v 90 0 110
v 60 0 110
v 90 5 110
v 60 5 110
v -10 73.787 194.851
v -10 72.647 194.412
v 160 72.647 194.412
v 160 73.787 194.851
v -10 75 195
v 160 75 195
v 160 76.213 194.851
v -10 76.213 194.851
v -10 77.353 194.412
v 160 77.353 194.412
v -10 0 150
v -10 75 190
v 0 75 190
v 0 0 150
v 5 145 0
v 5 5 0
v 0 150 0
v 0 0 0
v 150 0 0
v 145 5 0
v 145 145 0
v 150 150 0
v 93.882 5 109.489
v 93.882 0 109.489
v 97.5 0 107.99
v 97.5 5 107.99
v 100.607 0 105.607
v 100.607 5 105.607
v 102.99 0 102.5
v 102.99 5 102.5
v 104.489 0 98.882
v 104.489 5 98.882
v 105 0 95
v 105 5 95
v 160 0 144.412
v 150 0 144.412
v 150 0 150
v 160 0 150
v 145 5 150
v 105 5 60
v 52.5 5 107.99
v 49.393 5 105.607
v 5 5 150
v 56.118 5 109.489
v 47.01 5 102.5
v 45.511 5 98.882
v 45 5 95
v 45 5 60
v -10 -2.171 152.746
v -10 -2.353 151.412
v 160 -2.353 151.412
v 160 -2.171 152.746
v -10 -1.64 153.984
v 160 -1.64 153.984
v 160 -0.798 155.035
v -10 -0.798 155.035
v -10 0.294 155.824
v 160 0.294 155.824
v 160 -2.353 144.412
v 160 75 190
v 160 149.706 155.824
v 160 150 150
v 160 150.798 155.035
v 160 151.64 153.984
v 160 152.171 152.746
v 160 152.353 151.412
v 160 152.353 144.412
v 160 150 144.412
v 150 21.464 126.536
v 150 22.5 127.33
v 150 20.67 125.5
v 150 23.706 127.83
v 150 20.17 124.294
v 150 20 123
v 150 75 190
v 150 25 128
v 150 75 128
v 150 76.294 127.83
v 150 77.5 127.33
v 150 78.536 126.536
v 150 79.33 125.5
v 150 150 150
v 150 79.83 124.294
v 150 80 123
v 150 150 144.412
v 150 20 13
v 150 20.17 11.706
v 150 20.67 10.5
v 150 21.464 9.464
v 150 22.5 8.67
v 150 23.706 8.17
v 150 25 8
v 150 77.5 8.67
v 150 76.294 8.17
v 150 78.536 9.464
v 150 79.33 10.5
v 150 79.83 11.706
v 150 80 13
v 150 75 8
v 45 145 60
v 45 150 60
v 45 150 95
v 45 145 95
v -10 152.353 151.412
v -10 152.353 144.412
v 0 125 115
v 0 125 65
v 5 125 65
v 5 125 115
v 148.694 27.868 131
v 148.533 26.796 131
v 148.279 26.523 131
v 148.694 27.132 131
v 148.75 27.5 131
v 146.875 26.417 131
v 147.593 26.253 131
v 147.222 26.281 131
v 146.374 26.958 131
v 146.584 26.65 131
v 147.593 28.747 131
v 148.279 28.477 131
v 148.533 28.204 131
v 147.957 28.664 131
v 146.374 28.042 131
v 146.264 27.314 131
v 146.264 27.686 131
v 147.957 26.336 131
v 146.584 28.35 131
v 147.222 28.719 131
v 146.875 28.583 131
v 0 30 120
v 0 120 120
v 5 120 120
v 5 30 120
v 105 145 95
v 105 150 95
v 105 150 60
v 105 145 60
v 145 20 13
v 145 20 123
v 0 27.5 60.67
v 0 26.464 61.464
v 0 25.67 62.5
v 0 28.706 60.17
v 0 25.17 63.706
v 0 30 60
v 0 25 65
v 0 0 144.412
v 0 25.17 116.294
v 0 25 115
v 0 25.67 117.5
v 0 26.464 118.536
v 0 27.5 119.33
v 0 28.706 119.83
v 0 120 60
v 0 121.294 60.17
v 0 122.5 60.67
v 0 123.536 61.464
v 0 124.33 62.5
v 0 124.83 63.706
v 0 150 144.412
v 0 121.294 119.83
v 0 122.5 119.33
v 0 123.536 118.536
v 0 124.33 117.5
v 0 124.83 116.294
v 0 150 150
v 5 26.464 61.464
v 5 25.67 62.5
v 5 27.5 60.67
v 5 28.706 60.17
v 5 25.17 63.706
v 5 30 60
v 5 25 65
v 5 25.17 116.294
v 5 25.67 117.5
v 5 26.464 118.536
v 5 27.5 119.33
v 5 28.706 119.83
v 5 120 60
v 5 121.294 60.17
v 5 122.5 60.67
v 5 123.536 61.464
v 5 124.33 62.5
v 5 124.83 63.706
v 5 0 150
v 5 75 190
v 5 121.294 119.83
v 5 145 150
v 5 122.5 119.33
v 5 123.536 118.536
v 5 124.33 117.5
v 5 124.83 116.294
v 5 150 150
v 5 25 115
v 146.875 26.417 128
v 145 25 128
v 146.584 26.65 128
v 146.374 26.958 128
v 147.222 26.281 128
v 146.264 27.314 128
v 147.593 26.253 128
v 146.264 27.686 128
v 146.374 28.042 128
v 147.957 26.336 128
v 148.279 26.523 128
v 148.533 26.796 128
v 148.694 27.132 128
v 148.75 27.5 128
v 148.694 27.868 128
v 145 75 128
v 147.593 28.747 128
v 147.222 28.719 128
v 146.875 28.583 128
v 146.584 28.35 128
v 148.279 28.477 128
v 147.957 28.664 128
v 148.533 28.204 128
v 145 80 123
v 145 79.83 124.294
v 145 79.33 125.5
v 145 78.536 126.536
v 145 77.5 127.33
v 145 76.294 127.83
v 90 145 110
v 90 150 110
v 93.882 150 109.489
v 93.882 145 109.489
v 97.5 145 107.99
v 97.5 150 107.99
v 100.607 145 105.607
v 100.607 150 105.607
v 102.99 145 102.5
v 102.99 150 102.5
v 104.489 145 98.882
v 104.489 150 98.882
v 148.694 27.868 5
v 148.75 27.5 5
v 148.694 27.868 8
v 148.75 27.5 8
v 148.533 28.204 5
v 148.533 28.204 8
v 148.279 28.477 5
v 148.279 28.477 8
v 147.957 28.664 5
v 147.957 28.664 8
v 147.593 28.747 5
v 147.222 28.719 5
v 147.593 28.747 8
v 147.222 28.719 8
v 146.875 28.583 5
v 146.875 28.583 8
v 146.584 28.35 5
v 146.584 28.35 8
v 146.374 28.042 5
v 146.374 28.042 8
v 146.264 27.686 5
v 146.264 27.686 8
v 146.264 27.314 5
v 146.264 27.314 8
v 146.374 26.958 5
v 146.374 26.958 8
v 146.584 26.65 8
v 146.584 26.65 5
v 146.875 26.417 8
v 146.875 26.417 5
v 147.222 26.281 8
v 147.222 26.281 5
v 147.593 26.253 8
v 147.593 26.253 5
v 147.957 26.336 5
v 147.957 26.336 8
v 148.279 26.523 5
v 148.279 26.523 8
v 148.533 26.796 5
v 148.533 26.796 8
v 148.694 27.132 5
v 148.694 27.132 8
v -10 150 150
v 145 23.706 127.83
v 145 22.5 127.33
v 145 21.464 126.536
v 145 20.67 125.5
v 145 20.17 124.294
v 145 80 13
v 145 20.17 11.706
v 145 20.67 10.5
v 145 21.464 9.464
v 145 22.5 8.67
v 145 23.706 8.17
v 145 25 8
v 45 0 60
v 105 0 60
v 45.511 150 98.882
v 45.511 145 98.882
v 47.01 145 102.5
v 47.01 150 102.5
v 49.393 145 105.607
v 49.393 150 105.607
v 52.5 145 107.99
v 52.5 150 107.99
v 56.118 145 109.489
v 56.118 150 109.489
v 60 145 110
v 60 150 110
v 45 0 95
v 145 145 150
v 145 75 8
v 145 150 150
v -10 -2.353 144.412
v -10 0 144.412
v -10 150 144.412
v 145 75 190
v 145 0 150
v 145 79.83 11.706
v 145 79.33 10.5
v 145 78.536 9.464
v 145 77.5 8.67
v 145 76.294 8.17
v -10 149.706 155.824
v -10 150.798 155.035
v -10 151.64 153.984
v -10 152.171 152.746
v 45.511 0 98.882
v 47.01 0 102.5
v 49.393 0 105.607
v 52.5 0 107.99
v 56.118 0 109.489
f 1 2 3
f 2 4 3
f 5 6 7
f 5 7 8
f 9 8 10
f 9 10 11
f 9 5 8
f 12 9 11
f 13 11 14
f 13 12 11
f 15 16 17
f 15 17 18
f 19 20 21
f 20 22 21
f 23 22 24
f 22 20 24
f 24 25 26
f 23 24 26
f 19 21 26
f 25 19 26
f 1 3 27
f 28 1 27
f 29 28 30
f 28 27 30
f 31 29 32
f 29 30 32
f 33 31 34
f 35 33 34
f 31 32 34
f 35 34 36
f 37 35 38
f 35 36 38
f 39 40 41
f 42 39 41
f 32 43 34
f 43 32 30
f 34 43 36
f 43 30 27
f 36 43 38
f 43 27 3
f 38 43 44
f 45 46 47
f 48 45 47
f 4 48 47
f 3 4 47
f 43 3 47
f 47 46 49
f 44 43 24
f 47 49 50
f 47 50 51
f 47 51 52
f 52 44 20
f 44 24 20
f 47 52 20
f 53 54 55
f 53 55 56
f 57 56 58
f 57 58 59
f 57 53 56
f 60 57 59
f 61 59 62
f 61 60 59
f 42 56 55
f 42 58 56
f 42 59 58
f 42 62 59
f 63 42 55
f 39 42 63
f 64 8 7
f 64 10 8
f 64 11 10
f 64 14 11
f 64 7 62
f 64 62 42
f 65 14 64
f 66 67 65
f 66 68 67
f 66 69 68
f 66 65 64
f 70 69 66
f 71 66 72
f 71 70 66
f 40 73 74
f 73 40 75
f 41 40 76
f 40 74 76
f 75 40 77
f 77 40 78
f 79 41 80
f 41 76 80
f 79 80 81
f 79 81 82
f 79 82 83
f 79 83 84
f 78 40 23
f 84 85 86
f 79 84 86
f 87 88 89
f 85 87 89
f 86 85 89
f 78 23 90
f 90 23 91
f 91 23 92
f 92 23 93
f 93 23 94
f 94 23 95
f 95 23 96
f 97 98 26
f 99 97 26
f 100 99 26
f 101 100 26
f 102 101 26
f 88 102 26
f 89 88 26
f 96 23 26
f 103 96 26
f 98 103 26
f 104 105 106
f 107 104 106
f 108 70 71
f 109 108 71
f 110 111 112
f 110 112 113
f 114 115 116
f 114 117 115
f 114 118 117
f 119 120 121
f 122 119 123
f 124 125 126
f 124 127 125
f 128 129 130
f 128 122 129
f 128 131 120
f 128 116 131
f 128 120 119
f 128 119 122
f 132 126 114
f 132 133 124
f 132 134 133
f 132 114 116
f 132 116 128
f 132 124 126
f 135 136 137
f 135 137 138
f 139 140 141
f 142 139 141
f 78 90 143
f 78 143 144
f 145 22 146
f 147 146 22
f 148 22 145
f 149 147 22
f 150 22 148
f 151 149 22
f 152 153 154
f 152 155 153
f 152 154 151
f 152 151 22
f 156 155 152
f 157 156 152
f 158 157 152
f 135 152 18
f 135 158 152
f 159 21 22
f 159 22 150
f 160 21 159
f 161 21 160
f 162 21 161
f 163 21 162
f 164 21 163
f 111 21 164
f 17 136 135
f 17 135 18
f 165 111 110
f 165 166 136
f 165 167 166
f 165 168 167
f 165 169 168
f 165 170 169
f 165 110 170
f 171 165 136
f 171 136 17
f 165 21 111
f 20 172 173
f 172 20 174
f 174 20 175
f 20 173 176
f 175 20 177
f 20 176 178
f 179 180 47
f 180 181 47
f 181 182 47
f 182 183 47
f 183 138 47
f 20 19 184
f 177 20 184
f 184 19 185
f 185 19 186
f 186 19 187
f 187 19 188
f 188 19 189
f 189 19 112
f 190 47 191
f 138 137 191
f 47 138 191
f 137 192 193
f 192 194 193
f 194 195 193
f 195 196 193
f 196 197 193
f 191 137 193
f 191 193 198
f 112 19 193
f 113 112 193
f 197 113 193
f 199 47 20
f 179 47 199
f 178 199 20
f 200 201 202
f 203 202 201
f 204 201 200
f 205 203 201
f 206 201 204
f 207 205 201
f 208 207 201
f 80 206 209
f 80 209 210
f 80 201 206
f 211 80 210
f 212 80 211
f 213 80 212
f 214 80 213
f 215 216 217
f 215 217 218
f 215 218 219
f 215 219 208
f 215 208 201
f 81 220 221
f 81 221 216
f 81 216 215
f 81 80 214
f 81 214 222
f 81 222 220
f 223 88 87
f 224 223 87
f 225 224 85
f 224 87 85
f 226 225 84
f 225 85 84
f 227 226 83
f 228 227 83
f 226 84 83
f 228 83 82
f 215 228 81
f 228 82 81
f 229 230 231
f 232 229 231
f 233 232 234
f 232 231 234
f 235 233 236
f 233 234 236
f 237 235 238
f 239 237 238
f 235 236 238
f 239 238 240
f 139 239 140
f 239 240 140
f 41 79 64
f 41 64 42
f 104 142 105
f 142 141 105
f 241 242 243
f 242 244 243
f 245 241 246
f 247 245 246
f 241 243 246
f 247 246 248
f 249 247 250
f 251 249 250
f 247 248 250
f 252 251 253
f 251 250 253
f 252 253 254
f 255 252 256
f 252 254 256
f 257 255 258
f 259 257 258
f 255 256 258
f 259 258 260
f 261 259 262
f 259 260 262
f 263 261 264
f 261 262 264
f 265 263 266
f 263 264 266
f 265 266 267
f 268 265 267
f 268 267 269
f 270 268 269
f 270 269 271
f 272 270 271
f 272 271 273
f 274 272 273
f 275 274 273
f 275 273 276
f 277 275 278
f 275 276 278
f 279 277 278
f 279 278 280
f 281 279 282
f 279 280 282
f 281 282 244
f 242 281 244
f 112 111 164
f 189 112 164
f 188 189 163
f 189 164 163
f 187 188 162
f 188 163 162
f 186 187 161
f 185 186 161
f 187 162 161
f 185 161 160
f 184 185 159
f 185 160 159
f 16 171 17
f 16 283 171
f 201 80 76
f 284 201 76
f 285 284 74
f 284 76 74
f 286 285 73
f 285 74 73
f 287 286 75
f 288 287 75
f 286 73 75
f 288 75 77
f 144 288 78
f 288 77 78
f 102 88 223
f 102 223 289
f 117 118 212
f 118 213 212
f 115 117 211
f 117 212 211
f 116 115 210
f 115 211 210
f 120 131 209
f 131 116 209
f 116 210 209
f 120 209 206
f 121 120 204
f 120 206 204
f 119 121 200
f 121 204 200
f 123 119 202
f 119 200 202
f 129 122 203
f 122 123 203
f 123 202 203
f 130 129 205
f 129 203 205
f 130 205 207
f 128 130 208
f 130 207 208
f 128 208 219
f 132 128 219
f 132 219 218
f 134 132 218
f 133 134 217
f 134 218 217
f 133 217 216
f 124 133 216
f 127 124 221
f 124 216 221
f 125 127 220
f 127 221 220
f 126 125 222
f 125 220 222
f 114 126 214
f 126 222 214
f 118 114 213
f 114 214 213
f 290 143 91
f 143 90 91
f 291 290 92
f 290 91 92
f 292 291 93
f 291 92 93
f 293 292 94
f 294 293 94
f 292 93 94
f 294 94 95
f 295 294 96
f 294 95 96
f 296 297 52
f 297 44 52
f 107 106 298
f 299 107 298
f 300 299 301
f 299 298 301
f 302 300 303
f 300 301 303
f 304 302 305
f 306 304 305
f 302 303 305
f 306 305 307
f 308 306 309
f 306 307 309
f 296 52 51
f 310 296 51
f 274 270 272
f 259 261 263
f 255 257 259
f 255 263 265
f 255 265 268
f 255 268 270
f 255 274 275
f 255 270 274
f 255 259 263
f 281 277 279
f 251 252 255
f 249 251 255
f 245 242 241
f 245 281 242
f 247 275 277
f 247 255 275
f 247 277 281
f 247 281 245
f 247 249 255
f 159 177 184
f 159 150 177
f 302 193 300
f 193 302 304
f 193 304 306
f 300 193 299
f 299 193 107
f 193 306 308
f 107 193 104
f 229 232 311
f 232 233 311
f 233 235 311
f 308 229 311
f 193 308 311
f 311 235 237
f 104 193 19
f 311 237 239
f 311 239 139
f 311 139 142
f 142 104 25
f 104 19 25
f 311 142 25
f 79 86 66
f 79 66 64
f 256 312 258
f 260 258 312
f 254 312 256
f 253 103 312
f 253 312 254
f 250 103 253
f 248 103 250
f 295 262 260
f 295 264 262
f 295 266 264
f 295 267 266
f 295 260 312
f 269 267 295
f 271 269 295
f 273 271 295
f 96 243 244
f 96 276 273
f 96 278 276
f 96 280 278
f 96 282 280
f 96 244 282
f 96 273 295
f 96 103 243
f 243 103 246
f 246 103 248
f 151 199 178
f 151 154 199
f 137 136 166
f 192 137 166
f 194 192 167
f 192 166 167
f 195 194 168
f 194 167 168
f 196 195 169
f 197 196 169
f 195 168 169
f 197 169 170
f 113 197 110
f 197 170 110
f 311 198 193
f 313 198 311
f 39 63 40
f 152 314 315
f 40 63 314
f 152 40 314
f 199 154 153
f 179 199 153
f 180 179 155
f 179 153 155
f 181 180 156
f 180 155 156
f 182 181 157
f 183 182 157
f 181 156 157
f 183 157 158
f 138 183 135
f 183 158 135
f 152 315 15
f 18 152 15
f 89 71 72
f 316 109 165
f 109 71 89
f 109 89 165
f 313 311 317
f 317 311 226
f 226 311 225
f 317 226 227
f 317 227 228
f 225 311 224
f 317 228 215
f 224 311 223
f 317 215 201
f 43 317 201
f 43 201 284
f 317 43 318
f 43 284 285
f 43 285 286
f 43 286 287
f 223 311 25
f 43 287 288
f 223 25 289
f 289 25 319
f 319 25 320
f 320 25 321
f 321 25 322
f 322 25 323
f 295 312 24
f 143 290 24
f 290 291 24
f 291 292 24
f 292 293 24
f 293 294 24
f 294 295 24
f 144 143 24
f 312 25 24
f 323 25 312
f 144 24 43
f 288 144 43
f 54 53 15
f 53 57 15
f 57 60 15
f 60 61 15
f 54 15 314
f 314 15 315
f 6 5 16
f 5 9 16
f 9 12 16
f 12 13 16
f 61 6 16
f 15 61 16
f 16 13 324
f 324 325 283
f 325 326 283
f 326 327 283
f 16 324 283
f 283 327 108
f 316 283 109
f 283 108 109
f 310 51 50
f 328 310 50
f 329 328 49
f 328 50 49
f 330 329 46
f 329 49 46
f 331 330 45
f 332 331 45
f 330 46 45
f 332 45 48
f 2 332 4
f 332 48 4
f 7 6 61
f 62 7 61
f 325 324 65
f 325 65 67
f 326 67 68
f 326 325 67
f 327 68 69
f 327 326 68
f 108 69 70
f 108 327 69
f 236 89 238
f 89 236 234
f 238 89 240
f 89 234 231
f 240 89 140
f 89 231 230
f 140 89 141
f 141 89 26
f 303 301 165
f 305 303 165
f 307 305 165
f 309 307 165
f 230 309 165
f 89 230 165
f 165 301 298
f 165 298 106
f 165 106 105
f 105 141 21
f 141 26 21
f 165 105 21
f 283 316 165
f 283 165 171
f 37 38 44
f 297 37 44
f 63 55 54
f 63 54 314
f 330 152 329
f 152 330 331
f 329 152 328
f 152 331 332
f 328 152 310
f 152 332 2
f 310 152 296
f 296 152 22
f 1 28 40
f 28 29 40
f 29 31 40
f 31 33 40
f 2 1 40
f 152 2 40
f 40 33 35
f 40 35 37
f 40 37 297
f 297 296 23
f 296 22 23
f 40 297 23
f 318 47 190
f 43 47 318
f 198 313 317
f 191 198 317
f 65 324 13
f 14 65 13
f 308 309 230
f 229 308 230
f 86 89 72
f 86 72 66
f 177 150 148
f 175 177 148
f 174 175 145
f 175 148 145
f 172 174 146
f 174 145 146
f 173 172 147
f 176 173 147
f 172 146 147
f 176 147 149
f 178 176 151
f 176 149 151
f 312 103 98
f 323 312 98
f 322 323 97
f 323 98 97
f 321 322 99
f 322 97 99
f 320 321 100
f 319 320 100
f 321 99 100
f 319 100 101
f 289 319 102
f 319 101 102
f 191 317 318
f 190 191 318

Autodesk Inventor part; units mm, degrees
ref_plane "YZ Plane" through (0, 0, 0) normal (1, 0, 0) x (0, 1, 0)
sketch "Boceto1" plane through (0, 0, 0) normal (0, 0, 1) x (1, 0, 0)
  line L0 (0, 0) -> (150, 0)
  line L1 (150, 0) -> (150, 150)
  line L2 (150, 150) -> (0, 150)
  line L3 (0, 150) -> (0, 0)
  line L4 (5, 145) -> (145, 145)
  line L5 (145, 145) -> (145, 5)
  line L6 (145, 5) -> (5, 5)
  line L7 (5, 5) -> (5, 145)
  dimension "d0" = 150
  dimension "d1" = 150
  dimension "d2" = 5
extrude "Extrusión1" add sketch "Boceto1" along normal blind 150
sketch "Boceto2" plane through (150, 0, 0) normal (1, 0, 0) x (0, 0, -1)
  line L0 (-150, 0) -> (-150, 150) projected
  line L1 (-150, 75) -> (-190, 75) construction
  line L2 (-190, 75) -> (-150, 150)
  line L3 (0, 0) -> (-150, 0) construction
  line L4 (-150, 0) -> (-190, 75)
  dimension "d5" = 40
extrude "Extrusión2" add sketch "Boceto2" against normal blind 5
ref_plane "Plano de trabajo1" through (75, 0, 0) normal (1, 0, 0) x (0, 0, -1)
mirror "Simetría1" about plane through (75, 0, 0) normal (1, 0, 0) of "Extrusión2"
sketch "Boceto3" plane through (0, 150, 0) normal (0, 1, 0) x (1, 0, 0)
  line L0 (105, -60) -> (45, -60)
  line L1 (45, -60) -> (45, -95)
  line L2 (60, -110) -> (90, -110)
  line L3 (105, -95) -> (105, -60)
  line L4 (150, 0) -> (0, 0) projected
  line L5 (145, -150) -> (5, -150) projected
  arc A0 (90, -110) -> (105, -95) centre (90, -95) ccw
  arc A1 (45, -95) -> (60, -110) centre (60, -95) ccw
  point P0 (45, -110)
  point P1 (105, -110)
  point P2 (75, -60)
  point P3 (75, 0)
  dimension "d8" = 60
  dimension "d9" = 50
  dimension "d10" = 40
  dimension "d11" = 15
extrude "Extrusión3" cut sketch "Boceto3" against normal through all
sketch "Boceto4" plane through (150, 0, 0) normal (1, 0, 0) x (0, 0, -1)
  line L0 (-13, 20) -> (-123, 20)
  line L1 (-128, 25) -> (-128, 75)
  line L2 (-123, 80) -> (-13, 80)
  line L3 (-8, 75) -> (-8, 25)
  line L4 (0, 0) -> (0, 150) projected
  line L5 (0, 0) -> (-150, 0) projected
  arc A0 (-123, 80) -> (-128, 75) centre (-123, 75) ccw
  arc A1 (-8, 75) -> (-13, 80) centre (-13, 75) ccw
  arc A2 (-13, 20) -> (-8, 25) centre (-13, 25) ccw
  arc A3 (-128, 25) -> (-123, 20) centre (-123, 25) ccw
  point P0 (-128, 80)
  point P1 (-128, 20)
  point P2 (-8, 80)
  dimension "d14" = 120
  dimension "d15" = 60
  dimension "d16" = 8
  dimension "d17" = 20
  dimension "d18" = 5
extrude "Extrusión4" cut sketch "Boceto4" against normal up to surface (5 mm away)
sketch "Boceto5" plane through (0, 0, 0) normal (-1, 0, 0) x (0, 0, 1)
  line L0 (65, 125) -> (115, 125)
  line L1 (120, 120) -> (120, 30)
  line L2 (115, 25) -> (65, 25)
  line L3 (60, 30) -> (60, 120)
  line L4 (0, 150) -> (0, 0) projected
  arc A0 (120, 120) -> (115, 125) centre (115, 120) ccw
  arc A1 (115, 25) -> (120, 30) centre (115, 30) ccw
  arc A2 (65, 125) -> (60, 120) centre (65, 120) ccw
  arc A3 (60, 30) -> (65, 25) centre (65, 30) ccw
  point P0 (60, 150)
  point P1 (120, 25)
  point P2 (120, 125)
  point P3 (60, 25)
  point P4 (60, 75)
  point P5 (0, 75)
  dimension "d21" = 60
  dimension "d22" = 100
  dimension "d23" = 60
  dimension "d24" = 5
extrude "Extrusión5" cut sketch "Boceto5" against normal blind 10
sketch "Boceto6" plane through (150, 0, 0) normal (1, 0, 0) x (0, 0, -1)
  line L0 (-190, 75) -> (-150, 0) projected
  line L1 (-150, 150) -> (-190, 75) projected
  line L2 (-154.4118, 152.3529) -> (-195.6667, 75)
  line L3 (-195.6667, 75) -> (-154.4118, -2.3529)
  line L4 (-154.4118, 152.3529) -> (-144.4118, 152.3529)
  line L5 (-144.4118, 152.3529) -> (-144.4118, 150)
  line L6 (-154.4118, -2.3529) -> (-144.4118, -2.3529)
  line L7 (-144.4118, -2.3529) -> (-144.4118, 0)
  line L8 (0, 0) -> (-150, 0) projected
  line L9 (0, 150) -> (-150, 150) projected
  dimension "d27" = 5
  dimension "d28" = 10
extrude "Extrusión6" add sketch "Boceto6" along normal blind 10 and the other way blind 160
fillet "Empalme1" radius 5 3 edges at (75, 152.3529, 154.4118) (75, 75, 195.6667) (75, -2.3529, 154.4118)
sketch "Boceto7" plane through (150, 25, 8) normal (0, 0, 1) x (1, 0, 0)
  circle A0 centre (-2.5, 2.5) radius 1.25
  line L0 (0, 50) -> (0, 0) projected
  line L1 (0, 0) -> (-5, 0) projected
  point P0 (-150, -25)
  point P1 (-2.5, 0)
  dimension "d34" = 2.5
  dimension "d35" = 2.5
  dimension "d36" = 2.5
extrude "Extrusión7" cut sketch "Boceto7" against normal blind 3
ref_plane "Plano de trabajo2" through (150, 25, 68) normal (0, 0, 1) x (1, 0, 0)
mirror "Simetría2" about plane through (150, 25, 68) normal (0, 0, 1) of "Extrusión7"
properties part number "CasaJugueteAPM" material "Plástico ABS"
